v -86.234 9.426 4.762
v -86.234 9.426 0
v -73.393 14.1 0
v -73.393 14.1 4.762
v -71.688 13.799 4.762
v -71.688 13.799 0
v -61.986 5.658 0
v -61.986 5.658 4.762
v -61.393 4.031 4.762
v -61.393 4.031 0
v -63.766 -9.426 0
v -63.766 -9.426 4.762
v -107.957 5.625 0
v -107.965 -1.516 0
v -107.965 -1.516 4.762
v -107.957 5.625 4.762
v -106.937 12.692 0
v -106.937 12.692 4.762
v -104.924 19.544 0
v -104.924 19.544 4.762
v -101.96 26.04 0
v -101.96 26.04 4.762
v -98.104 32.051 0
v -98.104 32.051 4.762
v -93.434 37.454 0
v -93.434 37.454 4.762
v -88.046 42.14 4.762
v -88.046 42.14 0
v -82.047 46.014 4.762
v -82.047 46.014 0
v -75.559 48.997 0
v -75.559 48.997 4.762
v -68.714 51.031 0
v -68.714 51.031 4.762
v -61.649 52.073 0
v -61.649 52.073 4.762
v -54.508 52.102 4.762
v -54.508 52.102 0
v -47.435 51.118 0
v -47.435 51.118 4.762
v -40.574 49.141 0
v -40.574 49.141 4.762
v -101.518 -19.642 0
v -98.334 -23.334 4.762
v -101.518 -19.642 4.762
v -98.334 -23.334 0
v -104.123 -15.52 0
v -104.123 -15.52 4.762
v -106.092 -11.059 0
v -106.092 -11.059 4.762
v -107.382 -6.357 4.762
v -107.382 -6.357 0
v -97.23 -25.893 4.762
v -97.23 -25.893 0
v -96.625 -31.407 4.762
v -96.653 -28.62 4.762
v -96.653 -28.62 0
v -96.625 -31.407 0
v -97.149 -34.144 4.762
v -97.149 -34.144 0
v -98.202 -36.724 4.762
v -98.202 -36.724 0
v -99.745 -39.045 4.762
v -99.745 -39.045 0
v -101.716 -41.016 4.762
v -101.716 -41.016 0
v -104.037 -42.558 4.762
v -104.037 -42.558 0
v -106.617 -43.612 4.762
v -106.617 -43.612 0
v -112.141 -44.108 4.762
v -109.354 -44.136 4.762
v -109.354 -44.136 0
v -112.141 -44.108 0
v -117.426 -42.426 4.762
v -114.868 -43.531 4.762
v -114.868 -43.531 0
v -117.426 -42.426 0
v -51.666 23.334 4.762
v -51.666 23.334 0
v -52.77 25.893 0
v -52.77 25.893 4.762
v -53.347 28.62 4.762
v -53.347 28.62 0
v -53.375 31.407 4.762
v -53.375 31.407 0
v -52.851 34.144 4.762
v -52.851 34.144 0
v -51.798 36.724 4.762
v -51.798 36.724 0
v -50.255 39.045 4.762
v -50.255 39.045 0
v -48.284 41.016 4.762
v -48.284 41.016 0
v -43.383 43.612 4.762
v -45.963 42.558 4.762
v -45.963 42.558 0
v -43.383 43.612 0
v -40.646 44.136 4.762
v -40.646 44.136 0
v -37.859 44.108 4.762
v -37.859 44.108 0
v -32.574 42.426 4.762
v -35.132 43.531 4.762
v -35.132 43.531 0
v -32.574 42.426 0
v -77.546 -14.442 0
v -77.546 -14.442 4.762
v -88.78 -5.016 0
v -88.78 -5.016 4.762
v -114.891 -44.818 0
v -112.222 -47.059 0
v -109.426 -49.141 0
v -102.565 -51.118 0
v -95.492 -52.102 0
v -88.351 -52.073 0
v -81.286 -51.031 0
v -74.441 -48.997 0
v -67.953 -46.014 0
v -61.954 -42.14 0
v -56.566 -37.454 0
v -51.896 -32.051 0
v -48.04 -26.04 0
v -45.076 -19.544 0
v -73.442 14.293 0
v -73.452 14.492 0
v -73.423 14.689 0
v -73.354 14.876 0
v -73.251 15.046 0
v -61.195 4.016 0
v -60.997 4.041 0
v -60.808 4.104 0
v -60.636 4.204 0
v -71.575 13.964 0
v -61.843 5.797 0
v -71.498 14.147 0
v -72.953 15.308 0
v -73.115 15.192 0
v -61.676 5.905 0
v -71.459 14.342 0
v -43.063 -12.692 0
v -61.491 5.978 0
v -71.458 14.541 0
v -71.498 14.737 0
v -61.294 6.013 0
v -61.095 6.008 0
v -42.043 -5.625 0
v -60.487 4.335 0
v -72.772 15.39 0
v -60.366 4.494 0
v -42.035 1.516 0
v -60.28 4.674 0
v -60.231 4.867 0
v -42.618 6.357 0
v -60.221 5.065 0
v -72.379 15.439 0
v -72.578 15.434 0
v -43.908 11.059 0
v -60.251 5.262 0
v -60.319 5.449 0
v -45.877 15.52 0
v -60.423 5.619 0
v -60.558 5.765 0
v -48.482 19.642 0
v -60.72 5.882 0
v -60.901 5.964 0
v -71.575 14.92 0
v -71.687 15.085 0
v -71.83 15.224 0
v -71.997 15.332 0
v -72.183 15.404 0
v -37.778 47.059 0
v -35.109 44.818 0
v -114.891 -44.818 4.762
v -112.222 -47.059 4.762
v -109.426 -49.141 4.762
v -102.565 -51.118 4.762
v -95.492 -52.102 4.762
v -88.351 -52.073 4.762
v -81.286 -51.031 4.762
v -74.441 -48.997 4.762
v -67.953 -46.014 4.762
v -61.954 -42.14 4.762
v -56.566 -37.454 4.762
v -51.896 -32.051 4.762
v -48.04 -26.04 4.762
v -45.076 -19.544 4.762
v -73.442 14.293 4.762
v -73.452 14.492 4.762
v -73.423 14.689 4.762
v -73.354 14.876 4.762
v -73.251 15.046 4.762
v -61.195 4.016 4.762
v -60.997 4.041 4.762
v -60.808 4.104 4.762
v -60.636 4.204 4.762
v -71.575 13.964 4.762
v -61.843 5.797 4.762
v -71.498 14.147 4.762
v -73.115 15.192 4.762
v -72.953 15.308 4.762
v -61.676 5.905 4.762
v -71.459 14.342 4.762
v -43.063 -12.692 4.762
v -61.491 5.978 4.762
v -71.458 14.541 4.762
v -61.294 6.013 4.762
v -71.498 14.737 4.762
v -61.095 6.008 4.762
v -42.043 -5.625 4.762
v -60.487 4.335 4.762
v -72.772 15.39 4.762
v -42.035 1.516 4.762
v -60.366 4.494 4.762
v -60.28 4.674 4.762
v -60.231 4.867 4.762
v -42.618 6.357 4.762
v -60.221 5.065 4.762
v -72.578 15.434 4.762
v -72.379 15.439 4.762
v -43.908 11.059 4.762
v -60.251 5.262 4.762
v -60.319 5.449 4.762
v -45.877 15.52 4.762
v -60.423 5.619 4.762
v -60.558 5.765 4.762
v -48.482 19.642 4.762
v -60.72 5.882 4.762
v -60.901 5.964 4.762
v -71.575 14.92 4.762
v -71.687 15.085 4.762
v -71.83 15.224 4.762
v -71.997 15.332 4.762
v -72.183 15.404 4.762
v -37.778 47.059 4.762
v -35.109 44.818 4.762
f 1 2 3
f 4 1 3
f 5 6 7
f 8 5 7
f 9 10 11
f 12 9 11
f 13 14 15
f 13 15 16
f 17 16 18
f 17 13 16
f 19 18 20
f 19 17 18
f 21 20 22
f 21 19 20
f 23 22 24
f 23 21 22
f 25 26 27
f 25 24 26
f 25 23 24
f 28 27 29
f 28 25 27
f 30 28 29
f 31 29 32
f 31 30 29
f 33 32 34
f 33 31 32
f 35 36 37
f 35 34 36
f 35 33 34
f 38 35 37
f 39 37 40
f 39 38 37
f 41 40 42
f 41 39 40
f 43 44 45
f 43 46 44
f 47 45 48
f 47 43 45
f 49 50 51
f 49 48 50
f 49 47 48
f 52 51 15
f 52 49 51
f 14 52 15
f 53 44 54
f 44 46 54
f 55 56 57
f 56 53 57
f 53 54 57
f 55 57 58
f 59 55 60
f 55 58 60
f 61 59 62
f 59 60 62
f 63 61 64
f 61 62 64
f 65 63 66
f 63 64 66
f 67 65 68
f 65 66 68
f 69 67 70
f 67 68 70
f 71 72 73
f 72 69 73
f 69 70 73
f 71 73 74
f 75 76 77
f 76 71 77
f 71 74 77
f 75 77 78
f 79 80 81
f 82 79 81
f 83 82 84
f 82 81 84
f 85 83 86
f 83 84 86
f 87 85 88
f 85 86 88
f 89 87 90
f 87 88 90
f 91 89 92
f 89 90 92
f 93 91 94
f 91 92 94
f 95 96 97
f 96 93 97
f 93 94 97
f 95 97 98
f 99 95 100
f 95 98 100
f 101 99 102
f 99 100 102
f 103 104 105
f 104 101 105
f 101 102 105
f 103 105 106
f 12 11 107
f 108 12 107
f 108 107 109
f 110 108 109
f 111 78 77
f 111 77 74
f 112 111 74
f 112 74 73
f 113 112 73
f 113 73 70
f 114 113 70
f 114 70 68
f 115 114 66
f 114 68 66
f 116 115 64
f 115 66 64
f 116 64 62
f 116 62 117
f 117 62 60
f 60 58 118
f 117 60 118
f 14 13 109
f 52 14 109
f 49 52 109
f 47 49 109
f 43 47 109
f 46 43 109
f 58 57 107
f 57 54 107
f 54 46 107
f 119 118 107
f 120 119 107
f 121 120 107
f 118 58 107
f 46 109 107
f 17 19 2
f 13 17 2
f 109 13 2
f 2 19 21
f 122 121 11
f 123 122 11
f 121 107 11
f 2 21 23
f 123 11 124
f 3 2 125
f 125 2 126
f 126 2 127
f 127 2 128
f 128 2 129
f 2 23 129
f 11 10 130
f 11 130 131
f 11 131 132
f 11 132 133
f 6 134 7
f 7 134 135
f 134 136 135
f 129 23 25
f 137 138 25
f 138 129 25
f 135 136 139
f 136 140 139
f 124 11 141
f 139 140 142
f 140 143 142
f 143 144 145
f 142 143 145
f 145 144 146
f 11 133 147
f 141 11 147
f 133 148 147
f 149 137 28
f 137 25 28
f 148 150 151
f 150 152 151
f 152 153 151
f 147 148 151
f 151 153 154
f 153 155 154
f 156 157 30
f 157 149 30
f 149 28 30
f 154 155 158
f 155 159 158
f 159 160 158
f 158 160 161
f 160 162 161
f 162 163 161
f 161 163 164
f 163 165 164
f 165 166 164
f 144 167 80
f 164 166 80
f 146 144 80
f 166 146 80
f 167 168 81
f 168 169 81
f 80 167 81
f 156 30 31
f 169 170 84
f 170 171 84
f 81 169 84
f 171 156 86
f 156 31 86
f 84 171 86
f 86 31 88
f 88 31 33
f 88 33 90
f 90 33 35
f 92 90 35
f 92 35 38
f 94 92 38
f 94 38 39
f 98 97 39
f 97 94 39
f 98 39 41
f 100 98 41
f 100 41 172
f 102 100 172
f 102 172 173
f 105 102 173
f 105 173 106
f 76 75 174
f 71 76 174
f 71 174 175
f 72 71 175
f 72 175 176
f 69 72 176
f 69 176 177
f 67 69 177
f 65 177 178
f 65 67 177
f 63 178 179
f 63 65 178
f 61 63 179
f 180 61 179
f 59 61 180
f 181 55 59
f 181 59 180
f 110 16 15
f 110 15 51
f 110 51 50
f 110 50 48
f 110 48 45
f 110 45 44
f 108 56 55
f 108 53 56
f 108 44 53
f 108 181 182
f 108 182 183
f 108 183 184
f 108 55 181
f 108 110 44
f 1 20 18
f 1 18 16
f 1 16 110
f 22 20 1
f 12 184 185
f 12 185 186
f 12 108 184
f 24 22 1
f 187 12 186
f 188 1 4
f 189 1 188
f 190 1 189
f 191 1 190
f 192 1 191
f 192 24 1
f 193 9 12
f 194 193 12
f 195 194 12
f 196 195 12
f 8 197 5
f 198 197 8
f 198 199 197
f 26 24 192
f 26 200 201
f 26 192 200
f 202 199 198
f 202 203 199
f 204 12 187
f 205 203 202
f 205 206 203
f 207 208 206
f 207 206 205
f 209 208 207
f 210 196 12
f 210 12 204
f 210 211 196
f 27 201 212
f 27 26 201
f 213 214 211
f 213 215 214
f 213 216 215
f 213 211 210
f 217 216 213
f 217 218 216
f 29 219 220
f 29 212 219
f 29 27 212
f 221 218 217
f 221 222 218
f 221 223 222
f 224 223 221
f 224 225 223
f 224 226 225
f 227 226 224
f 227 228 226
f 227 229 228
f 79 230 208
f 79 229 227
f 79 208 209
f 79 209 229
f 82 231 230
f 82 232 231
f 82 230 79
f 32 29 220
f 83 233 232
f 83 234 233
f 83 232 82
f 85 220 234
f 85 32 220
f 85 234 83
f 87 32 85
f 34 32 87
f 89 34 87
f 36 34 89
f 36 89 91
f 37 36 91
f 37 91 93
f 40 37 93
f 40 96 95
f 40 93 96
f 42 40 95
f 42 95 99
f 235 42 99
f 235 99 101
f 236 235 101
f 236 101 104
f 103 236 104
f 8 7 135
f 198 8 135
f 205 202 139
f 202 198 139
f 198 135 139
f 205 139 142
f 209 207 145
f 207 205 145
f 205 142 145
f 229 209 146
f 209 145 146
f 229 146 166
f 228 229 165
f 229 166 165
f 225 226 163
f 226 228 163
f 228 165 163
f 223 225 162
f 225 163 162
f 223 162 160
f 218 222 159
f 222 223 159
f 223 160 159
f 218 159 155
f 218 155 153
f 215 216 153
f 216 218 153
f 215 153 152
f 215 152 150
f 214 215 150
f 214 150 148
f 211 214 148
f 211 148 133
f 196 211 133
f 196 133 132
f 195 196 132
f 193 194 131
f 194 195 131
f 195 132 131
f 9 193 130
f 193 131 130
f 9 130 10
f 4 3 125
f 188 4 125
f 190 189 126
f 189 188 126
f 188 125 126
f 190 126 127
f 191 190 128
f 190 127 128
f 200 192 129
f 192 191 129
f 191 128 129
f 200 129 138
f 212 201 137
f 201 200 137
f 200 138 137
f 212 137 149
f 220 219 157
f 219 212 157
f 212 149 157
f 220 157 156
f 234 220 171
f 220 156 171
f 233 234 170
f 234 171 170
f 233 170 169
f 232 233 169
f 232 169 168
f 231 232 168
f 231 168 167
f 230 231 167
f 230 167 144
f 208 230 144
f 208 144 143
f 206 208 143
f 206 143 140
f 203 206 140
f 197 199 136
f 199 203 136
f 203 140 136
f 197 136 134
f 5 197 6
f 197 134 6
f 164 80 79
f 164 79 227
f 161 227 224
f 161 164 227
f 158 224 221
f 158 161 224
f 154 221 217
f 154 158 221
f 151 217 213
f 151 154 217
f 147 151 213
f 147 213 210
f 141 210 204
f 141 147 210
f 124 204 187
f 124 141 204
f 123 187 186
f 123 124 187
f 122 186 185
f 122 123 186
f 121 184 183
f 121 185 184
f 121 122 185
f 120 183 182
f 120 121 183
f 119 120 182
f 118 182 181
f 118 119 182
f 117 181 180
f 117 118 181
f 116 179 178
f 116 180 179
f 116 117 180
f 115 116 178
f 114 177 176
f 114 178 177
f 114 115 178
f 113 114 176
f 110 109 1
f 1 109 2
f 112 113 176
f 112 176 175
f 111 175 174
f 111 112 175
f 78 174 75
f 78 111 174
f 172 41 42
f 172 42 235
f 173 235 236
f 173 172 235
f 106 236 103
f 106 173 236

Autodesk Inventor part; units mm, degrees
ref_plane "YZ Plane" through (0, 0, 0) normal (1, 0, 0) x (0, 1, 0)
ref_plane "XZ Plane" through (0, 0, 0) normal (0, 1, 0) x (-1, 0, 0)
ref_plane "XY Plane" through (0, 0, 0) normal (0, 0, 1) x (1, 0, 0)
sketch "Sketch1" plane through (0, 0, 0) normal (0, 0, 1) x (1, 0, 0)
  arc A0 (-117.4264, -42.4264) -> (-98.3345, -23.3345) centre (-110.6099, -30.151) ccw
  arc A1 (-117.4264, -42.4264) -> (-109.4264, -49.1408) centre (-75, 0) ccw
  arc A2 (-109.4264, -49.1408) -> (-42.0349, 1.5164) centre (-92.1264, -2.0002) ccw
  arc A3 (-42.0349, 1.5164) -> (-51.6655, 23.3345) centre (-75, 0) ccw
  arc A4 (-32.5736, 42.4264) -> (-51.6655, 23.3345) centre (-39.3901, 30.151) ccw
  arc A5 (-32.5736, 42.4264) -> (-40.5736, 49.1408) centre (-75, 0) ccw
  arc A6 (-40.5736, 49.1408) -> (-107.9651, -1.5164) centre (-57.8736, 2.0002) ccw
  arc A7 (-107.9651, -1.5164) -> (-98.3345, -23.3345) centre (-75, 0) ccw
  line L0 (-71.6875, 13.7991) -> (-61.9857, 5.6584)
  arc A8 (-61.3933, 4.0308) -> (-61.9857, 5.6584) centre (-61.2197, 5.0156) ccw
  line L1 (-61.3933, 4.0308) -> (-63.7662, -9.4263)
  line L2 (-63.7662, -9.4263) -> (-77.5465, -14.4419)
  line L3 (-77.5465, -14.4419) -> (-88.7803, -5.0156)
  line L4 (-88.7803, -5.0156) -> (-86.2338, 9.4263)
  line L5 (-86.2338, 9.4263) -> (-73.3932, 14.0999)
  arc A9 (-71.6875, 13.7991) -> (-73.3932, 14.0999) centre (-72.4535, 14.4419) ccw
  arc A10 (-109.4264, -49.1408) -> (-42.0349, 1.5164) centre (-92.1264, -2.0002) ccw
  arc A11 (-117.4264, -42.4264) -> (-109.4264, -49.1408) centre (-75, 0) ccw
  arc A12 (-117.4264, -42.4264) -> (-98.3345, -23.3345) centre (-110.6099, -30.151) ccw
  arc A13 (-107.9651, -1.5164) -> (-98.3345, -23.3345) centre (-75, 0) ccw
  arc A14 (-40.5736, 49.1408) -> (-107.9651, -1.5164) centre (-57.8736, 2.0002) ccw
  arc A15 (-32.5736, 42.4264) -> (-40.5736, 49.1408) centre (-75, 0) ccw
  arc A16 (-32.5736, 42.4264) -> (-51.6655, 23.3345) centre (-39.3901, 30.151) ccw
  arc A17 (-42.0349, 1.5164) -> (-51.6655, 23.3345) centre (-75, 0) ccw
  arc A18 (-109.4264, -49.1408) -> (-42.0349, 1.5164) centre (-92.1264, -2.0002) ccw
  point P0 (0, 0)
extrude "Extrusion1" add sketch "Sketch1" along normal blind 4.7625
properties part number "3-16inch_Knife2_Piece1"
